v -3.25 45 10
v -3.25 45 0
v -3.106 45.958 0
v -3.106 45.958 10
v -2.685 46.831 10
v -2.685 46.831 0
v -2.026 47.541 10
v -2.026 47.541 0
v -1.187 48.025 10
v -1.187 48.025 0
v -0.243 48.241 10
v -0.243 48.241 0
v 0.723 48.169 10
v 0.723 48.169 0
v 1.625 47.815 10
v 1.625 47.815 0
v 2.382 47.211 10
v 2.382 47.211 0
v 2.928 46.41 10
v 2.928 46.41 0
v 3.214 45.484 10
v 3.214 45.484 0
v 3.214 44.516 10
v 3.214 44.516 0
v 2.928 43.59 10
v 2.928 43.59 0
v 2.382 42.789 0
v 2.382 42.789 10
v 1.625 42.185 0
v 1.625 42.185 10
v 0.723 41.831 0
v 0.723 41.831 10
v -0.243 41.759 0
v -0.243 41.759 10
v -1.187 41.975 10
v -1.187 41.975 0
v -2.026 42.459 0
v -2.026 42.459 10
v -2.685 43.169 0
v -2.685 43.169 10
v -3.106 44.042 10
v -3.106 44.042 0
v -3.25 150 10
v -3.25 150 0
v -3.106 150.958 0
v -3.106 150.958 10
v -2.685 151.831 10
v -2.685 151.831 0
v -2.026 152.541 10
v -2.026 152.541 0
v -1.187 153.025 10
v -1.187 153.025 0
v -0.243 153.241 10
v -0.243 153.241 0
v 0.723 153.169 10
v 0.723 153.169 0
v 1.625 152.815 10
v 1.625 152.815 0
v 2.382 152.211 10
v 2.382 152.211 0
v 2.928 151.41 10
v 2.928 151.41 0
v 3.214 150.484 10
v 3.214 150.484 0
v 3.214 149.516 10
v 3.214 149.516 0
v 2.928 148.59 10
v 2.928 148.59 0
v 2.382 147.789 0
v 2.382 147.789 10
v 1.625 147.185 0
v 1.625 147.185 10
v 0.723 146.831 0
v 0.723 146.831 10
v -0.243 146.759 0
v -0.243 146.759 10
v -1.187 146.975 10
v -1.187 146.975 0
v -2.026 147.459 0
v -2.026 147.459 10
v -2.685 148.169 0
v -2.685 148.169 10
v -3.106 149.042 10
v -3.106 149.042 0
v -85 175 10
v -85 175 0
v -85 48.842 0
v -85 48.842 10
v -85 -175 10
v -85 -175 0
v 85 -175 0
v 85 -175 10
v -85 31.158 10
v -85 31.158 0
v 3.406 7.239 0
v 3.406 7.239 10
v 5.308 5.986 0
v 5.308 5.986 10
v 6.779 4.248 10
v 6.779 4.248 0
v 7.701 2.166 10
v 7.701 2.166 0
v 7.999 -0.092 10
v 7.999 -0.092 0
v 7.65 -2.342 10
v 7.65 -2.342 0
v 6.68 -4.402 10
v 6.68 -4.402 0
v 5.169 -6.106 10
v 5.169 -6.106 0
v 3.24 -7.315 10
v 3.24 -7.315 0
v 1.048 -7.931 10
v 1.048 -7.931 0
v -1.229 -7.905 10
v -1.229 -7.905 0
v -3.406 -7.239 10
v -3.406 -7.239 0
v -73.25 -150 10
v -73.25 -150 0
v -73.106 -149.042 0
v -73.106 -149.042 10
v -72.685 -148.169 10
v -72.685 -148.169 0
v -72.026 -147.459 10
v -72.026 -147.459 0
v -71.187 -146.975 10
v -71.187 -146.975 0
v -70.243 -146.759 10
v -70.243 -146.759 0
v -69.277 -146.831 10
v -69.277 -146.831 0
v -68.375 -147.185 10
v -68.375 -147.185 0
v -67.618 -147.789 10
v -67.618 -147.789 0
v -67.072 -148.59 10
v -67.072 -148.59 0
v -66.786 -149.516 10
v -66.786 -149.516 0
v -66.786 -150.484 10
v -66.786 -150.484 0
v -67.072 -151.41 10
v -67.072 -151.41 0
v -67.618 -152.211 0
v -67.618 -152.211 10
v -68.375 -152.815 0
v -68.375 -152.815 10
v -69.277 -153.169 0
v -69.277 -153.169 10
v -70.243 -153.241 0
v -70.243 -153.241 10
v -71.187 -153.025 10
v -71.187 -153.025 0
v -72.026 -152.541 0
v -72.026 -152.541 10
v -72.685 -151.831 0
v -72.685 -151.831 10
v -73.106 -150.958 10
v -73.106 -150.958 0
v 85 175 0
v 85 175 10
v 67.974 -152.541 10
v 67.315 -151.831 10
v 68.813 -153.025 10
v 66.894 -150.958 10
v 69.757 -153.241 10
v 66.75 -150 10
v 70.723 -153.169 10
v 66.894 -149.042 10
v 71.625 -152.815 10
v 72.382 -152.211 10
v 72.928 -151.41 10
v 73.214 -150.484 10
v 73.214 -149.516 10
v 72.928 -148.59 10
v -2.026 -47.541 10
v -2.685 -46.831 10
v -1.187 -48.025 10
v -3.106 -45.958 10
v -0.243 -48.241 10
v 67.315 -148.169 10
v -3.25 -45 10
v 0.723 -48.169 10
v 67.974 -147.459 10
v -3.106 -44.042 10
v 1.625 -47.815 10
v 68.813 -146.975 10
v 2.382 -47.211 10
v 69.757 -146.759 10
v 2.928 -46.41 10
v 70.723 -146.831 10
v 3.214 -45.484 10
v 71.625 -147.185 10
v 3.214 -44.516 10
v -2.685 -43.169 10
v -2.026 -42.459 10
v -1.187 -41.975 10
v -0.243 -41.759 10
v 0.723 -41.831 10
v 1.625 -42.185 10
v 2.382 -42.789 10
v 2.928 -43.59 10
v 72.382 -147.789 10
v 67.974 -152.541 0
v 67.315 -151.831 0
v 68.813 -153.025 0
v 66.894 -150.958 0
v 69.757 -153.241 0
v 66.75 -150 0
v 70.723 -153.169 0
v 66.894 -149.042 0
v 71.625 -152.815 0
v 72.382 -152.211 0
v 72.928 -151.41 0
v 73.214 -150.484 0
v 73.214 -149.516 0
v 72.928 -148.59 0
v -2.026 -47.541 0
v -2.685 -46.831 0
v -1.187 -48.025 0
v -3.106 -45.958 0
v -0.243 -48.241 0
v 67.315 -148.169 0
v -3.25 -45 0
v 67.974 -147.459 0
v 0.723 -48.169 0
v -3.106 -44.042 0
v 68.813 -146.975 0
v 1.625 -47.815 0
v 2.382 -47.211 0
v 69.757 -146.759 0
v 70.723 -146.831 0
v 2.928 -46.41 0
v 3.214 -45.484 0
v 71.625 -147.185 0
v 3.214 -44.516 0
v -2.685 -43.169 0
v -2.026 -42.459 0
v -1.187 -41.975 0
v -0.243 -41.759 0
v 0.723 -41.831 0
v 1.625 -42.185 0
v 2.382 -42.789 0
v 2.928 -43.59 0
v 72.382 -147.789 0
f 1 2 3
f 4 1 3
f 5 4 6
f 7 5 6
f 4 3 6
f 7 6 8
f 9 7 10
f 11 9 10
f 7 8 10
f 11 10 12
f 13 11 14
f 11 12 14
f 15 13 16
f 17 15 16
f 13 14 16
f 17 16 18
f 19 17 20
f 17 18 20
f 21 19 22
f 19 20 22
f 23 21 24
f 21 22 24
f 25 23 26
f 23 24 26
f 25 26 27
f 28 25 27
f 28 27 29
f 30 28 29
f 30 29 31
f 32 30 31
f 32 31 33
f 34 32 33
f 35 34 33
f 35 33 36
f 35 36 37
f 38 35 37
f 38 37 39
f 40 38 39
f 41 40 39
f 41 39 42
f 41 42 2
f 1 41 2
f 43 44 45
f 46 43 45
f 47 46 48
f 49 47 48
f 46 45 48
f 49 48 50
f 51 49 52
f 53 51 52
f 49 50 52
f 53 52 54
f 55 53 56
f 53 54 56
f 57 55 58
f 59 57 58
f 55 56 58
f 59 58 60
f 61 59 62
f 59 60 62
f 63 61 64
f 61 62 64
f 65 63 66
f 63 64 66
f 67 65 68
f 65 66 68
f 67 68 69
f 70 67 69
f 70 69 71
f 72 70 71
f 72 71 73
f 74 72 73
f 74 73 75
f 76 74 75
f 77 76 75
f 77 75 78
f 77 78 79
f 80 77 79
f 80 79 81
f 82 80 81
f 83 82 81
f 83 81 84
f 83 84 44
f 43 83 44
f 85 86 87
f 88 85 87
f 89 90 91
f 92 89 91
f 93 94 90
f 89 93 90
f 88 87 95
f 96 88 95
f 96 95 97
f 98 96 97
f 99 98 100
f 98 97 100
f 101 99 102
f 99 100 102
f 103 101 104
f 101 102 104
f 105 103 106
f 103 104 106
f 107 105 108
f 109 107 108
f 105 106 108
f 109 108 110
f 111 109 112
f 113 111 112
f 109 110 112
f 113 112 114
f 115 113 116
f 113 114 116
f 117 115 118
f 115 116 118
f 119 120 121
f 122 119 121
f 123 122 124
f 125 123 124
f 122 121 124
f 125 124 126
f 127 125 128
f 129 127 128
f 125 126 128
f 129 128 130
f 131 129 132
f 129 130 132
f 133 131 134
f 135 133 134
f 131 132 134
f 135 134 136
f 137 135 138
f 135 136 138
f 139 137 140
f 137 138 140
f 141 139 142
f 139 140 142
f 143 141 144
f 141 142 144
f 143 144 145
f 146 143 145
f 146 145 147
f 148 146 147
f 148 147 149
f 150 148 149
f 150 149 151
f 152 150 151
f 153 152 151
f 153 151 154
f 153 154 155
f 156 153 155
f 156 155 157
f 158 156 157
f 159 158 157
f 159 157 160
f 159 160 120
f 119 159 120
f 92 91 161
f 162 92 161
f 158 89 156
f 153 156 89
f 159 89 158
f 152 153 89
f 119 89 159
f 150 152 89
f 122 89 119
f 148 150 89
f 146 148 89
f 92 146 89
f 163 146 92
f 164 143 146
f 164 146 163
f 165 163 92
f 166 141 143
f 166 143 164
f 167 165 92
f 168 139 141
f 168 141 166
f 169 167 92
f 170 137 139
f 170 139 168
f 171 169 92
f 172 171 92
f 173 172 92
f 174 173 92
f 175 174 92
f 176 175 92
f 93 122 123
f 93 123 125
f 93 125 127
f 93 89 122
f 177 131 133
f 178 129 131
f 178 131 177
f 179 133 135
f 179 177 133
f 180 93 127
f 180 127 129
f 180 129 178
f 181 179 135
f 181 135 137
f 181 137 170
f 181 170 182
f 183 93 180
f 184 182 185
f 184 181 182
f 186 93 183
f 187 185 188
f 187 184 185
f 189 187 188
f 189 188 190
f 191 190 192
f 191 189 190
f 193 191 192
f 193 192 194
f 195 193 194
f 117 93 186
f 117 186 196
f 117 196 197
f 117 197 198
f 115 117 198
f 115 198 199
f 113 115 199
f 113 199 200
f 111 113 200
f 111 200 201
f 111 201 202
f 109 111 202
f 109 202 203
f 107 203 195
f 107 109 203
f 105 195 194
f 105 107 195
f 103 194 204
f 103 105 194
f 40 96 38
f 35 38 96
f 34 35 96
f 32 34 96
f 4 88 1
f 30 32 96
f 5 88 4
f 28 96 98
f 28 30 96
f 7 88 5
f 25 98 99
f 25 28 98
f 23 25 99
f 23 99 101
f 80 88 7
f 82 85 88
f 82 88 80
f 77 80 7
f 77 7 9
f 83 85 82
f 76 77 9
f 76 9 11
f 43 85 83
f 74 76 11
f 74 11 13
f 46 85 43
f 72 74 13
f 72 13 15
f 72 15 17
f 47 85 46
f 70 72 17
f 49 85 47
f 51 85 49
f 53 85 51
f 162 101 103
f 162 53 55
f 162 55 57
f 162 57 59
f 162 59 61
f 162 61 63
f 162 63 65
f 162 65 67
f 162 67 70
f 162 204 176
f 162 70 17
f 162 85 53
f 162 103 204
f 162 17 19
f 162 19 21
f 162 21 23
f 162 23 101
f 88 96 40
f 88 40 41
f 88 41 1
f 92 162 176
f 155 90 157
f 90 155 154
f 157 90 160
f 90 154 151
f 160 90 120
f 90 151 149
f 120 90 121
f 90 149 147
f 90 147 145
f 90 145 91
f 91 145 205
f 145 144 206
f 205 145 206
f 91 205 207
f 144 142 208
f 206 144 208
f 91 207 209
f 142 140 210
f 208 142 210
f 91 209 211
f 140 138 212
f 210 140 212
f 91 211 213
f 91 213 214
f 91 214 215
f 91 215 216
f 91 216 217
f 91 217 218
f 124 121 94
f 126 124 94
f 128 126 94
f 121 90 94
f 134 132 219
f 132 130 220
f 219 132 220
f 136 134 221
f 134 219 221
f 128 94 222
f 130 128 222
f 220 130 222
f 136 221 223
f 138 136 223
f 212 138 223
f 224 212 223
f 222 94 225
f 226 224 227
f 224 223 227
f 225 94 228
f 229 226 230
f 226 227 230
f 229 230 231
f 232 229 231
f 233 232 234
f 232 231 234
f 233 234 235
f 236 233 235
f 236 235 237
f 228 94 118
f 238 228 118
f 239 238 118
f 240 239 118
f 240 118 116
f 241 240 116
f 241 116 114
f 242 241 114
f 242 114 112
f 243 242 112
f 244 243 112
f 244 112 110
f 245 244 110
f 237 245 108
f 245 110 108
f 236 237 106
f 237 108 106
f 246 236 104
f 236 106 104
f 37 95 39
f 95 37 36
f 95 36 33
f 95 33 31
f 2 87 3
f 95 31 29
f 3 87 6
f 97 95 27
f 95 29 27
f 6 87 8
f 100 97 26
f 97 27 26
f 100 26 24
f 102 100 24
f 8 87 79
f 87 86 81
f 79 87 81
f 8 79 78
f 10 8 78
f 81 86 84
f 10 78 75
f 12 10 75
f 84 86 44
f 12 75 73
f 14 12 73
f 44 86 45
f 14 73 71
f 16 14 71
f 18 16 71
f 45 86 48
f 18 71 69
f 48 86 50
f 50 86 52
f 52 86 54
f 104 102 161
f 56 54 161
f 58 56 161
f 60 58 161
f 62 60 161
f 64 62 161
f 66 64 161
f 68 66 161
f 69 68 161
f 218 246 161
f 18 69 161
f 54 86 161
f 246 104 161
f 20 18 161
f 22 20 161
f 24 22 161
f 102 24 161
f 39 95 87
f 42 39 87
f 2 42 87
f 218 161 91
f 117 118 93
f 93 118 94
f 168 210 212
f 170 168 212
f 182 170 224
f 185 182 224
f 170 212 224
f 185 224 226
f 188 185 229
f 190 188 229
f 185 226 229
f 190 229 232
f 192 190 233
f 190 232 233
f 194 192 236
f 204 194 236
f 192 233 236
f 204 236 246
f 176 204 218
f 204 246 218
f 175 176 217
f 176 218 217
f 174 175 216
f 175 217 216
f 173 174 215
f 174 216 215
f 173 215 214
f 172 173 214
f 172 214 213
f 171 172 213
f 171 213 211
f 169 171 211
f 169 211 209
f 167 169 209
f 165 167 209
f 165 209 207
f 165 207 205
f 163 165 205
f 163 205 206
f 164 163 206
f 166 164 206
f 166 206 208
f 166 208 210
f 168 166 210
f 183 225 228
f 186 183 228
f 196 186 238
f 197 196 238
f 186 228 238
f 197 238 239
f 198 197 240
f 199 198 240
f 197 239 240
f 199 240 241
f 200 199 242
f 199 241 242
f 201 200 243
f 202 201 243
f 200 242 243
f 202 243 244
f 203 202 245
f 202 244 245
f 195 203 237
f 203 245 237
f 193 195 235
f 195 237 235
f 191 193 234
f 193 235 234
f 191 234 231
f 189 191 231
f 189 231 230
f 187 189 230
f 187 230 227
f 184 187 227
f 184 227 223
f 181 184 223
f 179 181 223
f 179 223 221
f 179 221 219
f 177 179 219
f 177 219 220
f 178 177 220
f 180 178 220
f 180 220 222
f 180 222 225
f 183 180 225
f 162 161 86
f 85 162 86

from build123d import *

# Parameters (mm, degrees)
AUFSATZ_LINEAR_AUSTRAGEN1_DEPTH  = 10
F_6_5_6_5_DURCHMESSER_BOHRUNG5_D = 6.5


with BuildPart() as part:
    # Skizze1 → Aufsatz-Linear austragen1 (new body)
    with BuildSketch(Plane.XY):
        with BuildLine():
            Line((85, 175), (-85, 175))
            Line((-85, 175), (-85, 48.841550225))
            Line((-85, 48.841550225), (3.406376291, 7.238549618))
            ThreePointArc((3.406376291, 7.238549618), (7.238549618, -3.406376291), (-3.406376291, -7.238549618))
            Line((-3.406376291, -7.238549618), (-85, 31.158449775))
            Line((-85, 31.158449775), (-85, -175))
            Line((-85, -175), (85, -175))
            Line((85, -175), (85, 175))
        make_face()
    extrude(amount=AUFSATZ_LINEAR_AUSTRAGEN1_DEPTH)

    # Ø6.5 (6.5) Durchmesser Bohrung5 (through all)
    with Locations(Plane.XY.offset(10)):
        with Locations((0, 150), (-70, -150), (70, -150), (0, 45), (0, -45)):
            Hole(F_6_5_6_5_DURCHMESSER_BOHRUNG5_D / 2)


solid = part.part
